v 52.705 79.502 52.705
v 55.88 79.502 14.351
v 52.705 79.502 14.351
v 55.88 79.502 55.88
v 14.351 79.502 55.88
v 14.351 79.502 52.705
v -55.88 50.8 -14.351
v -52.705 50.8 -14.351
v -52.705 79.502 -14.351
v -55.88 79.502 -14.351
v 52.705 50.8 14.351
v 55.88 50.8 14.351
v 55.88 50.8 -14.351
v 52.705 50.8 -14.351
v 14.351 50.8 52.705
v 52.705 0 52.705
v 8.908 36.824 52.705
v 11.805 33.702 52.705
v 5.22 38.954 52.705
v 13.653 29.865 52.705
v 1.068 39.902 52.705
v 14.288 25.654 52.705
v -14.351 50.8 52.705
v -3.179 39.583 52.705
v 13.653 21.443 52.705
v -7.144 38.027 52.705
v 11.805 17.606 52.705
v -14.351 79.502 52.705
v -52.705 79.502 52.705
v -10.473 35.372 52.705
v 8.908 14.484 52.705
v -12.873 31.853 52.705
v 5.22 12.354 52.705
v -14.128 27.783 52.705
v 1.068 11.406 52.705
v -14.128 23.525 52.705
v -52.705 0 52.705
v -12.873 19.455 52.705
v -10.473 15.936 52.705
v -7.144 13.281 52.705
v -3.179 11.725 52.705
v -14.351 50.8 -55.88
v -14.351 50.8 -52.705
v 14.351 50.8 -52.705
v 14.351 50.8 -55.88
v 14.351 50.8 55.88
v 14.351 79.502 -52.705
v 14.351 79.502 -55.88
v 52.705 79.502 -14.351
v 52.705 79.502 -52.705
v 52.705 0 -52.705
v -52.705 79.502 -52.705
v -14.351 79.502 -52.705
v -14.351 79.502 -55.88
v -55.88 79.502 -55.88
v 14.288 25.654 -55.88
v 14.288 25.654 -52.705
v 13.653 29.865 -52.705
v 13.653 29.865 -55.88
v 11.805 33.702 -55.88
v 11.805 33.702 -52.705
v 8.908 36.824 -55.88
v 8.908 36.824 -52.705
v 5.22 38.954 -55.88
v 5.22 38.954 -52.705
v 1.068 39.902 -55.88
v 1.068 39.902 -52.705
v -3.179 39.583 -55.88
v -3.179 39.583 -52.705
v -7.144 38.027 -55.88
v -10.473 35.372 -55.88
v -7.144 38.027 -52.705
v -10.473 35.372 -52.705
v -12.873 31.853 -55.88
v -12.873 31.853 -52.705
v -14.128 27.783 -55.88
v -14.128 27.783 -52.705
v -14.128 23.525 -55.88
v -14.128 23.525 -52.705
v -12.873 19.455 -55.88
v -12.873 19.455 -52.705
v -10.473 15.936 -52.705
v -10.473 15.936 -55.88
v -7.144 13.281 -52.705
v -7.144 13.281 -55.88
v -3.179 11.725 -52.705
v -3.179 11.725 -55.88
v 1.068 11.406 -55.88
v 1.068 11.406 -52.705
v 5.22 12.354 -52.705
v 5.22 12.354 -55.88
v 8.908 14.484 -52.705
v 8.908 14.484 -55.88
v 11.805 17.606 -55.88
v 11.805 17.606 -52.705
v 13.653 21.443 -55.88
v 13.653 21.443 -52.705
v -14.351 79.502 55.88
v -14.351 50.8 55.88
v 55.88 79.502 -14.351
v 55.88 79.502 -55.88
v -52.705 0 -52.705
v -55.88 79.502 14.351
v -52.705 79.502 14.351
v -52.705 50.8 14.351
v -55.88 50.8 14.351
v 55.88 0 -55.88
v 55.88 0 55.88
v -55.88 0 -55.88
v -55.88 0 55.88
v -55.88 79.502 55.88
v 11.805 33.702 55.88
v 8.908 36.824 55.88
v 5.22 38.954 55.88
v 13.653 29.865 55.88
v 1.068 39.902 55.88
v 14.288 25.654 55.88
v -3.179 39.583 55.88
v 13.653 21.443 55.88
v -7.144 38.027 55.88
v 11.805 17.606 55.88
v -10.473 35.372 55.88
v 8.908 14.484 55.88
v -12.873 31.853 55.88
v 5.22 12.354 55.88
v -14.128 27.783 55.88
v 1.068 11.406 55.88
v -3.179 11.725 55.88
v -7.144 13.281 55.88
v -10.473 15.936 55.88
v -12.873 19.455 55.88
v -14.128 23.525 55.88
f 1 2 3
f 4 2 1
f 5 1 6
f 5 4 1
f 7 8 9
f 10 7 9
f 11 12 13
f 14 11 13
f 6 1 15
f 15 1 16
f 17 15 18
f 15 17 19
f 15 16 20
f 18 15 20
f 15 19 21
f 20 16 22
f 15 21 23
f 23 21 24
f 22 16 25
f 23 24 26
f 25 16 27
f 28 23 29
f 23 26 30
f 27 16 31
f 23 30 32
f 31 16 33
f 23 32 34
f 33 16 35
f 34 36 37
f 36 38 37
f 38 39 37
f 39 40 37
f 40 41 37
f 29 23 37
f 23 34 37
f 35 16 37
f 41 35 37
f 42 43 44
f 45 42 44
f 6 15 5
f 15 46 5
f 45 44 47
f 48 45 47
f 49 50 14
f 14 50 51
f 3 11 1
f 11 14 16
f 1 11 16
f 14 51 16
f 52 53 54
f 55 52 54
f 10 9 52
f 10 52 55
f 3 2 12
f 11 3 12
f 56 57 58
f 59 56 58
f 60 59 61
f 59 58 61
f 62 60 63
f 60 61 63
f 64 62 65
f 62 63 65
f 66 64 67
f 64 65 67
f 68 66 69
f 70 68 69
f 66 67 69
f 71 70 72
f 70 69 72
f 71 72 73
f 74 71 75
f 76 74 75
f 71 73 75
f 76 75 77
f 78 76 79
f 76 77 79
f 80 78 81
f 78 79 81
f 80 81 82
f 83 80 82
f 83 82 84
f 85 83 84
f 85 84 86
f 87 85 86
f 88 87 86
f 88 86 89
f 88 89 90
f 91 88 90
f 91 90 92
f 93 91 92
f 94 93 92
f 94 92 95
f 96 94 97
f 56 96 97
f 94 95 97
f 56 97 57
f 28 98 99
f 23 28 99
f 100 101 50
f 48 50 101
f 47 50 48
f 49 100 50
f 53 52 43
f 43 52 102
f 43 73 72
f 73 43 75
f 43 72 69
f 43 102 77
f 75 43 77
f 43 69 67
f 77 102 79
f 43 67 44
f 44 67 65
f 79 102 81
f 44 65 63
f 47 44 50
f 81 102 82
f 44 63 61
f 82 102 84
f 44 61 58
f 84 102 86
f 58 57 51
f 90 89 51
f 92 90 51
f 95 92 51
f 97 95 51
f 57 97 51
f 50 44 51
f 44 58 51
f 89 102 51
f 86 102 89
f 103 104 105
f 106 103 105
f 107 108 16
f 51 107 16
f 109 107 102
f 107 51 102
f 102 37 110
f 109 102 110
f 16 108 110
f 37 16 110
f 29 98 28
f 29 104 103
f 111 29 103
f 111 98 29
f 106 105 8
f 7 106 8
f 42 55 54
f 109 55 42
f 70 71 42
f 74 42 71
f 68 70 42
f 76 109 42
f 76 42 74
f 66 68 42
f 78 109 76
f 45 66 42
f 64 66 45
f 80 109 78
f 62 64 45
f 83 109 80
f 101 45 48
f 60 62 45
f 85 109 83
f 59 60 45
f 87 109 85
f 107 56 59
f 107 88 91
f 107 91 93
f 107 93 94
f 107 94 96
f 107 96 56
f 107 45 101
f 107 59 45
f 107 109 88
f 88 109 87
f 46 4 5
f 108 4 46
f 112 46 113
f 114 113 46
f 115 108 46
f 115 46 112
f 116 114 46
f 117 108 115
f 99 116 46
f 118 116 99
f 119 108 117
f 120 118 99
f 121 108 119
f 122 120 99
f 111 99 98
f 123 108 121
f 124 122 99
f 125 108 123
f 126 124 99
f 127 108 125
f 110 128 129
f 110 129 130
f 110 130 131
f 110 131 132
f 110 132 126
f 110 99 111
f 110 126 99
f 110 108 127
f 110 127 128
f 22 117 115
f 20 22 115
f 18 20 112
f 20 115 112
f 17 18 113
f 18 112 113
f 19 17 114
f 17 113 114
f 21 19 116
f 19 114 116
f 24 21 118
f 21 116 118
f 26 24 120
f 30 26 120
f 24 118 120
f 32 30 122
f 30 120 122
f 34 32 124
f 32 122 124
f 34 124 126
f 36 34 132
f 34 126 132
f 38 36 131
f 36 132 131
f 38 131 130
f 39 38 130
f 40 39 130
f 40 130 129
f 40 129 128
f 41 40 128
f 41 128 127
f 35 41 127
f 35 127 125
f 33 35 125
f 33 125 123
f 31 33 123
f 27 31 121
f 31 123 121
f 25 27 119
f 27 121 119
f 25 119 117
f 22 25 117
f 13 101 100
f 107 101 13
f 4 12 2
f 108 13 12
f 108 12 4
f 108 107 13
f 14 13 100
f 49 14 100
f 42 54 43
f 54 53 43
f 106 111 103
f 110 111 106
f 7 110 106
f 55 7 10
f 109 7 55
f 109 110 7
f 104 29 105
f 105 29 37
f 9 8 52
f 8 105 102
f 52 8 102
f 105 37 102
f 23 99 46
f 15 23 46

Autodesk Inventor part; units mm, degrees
ref_plane "YZ Plane" through (0, 0, 0) normal (1, 0, 0) x (0, 1, 0)
ref_plane "XZ Plane" through (0, 0, 0) normal (0, 1, 0) x (-1, 0, 0)
ref_plane "XY Plane" through (0, 0, 0) normal (0, 0, 1) x (1, 0, 0)
sketch "Sketch2" plane through (0, 0, 0) normal (0, 1, 0) x (-1, 0, 0)
  line L0 (55.88, 55.88) -> (55.88, -55.88)
  line L1 (78.232, 0) -> (-78.232, 0) projected
  line L2 (55.88, -55.88) -> (-55.88, -55.88)
  line L3 (-55.88, -55.88) -> (-55.88, 55.88)
  line L4 (-55.88, 55.88) -> (55.88, 55.88)
  line L5 (0, -78.232) -> (0, 78.232) projected
  point P0 (0, 0)
  dimension "d0" = 111.76
  dimension "d1" = 111.76
extrude "Extrusion1" add sketch "Sketch2" along normal blind 79.502
shell "Shell1" thickness 3.175 removed faces 2 at (-18.6267, 0, -18.6267) at (-18.6267, 79.502, -18.6267)
sketch "Sketch3" plane through (-55.88, 0, 55.88) normal (0, 0, 1) x (1, 0, 0)
  line L0 (111.76, 79.502) -> (0, 79.502) projected
  line L1 (0, 79.502) -> (41.529, 79.502)
  line L2 (41.529, 79.502) -> (41.529, 50.8)
  line L3 (41.529, 50.8) -> (70.231, 50.8)
  line L4 (70.231, 50.8) -> (70.231, 79.502)
  line L5 (70.231, 79.502) -> (41.529, 79.502)
  line L6 (108.585, 0) -> (3.175, 0) projected
  circle A0 centre (55.88, 25.654) radius 14.2875
  line L7 (111.76, 0) -> (111.76, 79.502) projected
  line L8 (0, 0) -> (0, 79.502) projected
  line L9 (0, 0) -> (55.88, 0)
  line L10 (55.88, 0) -> (55.88, 79.502)
  dimension "d6" = 28.702
  dimension "d10" = 28.575
  dimension "d19" = 28.702
extrude "Extrusion2" cut sketch "Sketch3" against normal up to surface (111.76 mm away) contours L4 L3 L10 L0 | L10 L3 L2 L0 | L10 A0 | A0 L10
sketch "Sketch4" plane through (55.88, 0, 55.88) normal (1, 0, 0) x (0, 0, -1)
  line L0 (0, 79.502) -> (111.76, 79.502) projected
  line L1 (0, 79.502) -> (41.529, 79.502)
  line L2 (41.529, 79.502) -> (41.529, 50.8)
  line L3 (41.529, 50.8) -> (70.231, 50.8)
  line L4 (70.231, 50.8) -> (70.231, 79.502)
  line L5 (70.231, 79.502) -> (41.529, 79.502)
  point P0 (55.88, 0)
  dimension "d13" = 41.529
  dimension "d14" = 28.702
  dimension "d15" = 28.702
extrude "Extrusion3" cut sketch "Sketch4" against normal up to surface (111.76 mm away)
properties part number "DIFF_HOUSING_WIP"
